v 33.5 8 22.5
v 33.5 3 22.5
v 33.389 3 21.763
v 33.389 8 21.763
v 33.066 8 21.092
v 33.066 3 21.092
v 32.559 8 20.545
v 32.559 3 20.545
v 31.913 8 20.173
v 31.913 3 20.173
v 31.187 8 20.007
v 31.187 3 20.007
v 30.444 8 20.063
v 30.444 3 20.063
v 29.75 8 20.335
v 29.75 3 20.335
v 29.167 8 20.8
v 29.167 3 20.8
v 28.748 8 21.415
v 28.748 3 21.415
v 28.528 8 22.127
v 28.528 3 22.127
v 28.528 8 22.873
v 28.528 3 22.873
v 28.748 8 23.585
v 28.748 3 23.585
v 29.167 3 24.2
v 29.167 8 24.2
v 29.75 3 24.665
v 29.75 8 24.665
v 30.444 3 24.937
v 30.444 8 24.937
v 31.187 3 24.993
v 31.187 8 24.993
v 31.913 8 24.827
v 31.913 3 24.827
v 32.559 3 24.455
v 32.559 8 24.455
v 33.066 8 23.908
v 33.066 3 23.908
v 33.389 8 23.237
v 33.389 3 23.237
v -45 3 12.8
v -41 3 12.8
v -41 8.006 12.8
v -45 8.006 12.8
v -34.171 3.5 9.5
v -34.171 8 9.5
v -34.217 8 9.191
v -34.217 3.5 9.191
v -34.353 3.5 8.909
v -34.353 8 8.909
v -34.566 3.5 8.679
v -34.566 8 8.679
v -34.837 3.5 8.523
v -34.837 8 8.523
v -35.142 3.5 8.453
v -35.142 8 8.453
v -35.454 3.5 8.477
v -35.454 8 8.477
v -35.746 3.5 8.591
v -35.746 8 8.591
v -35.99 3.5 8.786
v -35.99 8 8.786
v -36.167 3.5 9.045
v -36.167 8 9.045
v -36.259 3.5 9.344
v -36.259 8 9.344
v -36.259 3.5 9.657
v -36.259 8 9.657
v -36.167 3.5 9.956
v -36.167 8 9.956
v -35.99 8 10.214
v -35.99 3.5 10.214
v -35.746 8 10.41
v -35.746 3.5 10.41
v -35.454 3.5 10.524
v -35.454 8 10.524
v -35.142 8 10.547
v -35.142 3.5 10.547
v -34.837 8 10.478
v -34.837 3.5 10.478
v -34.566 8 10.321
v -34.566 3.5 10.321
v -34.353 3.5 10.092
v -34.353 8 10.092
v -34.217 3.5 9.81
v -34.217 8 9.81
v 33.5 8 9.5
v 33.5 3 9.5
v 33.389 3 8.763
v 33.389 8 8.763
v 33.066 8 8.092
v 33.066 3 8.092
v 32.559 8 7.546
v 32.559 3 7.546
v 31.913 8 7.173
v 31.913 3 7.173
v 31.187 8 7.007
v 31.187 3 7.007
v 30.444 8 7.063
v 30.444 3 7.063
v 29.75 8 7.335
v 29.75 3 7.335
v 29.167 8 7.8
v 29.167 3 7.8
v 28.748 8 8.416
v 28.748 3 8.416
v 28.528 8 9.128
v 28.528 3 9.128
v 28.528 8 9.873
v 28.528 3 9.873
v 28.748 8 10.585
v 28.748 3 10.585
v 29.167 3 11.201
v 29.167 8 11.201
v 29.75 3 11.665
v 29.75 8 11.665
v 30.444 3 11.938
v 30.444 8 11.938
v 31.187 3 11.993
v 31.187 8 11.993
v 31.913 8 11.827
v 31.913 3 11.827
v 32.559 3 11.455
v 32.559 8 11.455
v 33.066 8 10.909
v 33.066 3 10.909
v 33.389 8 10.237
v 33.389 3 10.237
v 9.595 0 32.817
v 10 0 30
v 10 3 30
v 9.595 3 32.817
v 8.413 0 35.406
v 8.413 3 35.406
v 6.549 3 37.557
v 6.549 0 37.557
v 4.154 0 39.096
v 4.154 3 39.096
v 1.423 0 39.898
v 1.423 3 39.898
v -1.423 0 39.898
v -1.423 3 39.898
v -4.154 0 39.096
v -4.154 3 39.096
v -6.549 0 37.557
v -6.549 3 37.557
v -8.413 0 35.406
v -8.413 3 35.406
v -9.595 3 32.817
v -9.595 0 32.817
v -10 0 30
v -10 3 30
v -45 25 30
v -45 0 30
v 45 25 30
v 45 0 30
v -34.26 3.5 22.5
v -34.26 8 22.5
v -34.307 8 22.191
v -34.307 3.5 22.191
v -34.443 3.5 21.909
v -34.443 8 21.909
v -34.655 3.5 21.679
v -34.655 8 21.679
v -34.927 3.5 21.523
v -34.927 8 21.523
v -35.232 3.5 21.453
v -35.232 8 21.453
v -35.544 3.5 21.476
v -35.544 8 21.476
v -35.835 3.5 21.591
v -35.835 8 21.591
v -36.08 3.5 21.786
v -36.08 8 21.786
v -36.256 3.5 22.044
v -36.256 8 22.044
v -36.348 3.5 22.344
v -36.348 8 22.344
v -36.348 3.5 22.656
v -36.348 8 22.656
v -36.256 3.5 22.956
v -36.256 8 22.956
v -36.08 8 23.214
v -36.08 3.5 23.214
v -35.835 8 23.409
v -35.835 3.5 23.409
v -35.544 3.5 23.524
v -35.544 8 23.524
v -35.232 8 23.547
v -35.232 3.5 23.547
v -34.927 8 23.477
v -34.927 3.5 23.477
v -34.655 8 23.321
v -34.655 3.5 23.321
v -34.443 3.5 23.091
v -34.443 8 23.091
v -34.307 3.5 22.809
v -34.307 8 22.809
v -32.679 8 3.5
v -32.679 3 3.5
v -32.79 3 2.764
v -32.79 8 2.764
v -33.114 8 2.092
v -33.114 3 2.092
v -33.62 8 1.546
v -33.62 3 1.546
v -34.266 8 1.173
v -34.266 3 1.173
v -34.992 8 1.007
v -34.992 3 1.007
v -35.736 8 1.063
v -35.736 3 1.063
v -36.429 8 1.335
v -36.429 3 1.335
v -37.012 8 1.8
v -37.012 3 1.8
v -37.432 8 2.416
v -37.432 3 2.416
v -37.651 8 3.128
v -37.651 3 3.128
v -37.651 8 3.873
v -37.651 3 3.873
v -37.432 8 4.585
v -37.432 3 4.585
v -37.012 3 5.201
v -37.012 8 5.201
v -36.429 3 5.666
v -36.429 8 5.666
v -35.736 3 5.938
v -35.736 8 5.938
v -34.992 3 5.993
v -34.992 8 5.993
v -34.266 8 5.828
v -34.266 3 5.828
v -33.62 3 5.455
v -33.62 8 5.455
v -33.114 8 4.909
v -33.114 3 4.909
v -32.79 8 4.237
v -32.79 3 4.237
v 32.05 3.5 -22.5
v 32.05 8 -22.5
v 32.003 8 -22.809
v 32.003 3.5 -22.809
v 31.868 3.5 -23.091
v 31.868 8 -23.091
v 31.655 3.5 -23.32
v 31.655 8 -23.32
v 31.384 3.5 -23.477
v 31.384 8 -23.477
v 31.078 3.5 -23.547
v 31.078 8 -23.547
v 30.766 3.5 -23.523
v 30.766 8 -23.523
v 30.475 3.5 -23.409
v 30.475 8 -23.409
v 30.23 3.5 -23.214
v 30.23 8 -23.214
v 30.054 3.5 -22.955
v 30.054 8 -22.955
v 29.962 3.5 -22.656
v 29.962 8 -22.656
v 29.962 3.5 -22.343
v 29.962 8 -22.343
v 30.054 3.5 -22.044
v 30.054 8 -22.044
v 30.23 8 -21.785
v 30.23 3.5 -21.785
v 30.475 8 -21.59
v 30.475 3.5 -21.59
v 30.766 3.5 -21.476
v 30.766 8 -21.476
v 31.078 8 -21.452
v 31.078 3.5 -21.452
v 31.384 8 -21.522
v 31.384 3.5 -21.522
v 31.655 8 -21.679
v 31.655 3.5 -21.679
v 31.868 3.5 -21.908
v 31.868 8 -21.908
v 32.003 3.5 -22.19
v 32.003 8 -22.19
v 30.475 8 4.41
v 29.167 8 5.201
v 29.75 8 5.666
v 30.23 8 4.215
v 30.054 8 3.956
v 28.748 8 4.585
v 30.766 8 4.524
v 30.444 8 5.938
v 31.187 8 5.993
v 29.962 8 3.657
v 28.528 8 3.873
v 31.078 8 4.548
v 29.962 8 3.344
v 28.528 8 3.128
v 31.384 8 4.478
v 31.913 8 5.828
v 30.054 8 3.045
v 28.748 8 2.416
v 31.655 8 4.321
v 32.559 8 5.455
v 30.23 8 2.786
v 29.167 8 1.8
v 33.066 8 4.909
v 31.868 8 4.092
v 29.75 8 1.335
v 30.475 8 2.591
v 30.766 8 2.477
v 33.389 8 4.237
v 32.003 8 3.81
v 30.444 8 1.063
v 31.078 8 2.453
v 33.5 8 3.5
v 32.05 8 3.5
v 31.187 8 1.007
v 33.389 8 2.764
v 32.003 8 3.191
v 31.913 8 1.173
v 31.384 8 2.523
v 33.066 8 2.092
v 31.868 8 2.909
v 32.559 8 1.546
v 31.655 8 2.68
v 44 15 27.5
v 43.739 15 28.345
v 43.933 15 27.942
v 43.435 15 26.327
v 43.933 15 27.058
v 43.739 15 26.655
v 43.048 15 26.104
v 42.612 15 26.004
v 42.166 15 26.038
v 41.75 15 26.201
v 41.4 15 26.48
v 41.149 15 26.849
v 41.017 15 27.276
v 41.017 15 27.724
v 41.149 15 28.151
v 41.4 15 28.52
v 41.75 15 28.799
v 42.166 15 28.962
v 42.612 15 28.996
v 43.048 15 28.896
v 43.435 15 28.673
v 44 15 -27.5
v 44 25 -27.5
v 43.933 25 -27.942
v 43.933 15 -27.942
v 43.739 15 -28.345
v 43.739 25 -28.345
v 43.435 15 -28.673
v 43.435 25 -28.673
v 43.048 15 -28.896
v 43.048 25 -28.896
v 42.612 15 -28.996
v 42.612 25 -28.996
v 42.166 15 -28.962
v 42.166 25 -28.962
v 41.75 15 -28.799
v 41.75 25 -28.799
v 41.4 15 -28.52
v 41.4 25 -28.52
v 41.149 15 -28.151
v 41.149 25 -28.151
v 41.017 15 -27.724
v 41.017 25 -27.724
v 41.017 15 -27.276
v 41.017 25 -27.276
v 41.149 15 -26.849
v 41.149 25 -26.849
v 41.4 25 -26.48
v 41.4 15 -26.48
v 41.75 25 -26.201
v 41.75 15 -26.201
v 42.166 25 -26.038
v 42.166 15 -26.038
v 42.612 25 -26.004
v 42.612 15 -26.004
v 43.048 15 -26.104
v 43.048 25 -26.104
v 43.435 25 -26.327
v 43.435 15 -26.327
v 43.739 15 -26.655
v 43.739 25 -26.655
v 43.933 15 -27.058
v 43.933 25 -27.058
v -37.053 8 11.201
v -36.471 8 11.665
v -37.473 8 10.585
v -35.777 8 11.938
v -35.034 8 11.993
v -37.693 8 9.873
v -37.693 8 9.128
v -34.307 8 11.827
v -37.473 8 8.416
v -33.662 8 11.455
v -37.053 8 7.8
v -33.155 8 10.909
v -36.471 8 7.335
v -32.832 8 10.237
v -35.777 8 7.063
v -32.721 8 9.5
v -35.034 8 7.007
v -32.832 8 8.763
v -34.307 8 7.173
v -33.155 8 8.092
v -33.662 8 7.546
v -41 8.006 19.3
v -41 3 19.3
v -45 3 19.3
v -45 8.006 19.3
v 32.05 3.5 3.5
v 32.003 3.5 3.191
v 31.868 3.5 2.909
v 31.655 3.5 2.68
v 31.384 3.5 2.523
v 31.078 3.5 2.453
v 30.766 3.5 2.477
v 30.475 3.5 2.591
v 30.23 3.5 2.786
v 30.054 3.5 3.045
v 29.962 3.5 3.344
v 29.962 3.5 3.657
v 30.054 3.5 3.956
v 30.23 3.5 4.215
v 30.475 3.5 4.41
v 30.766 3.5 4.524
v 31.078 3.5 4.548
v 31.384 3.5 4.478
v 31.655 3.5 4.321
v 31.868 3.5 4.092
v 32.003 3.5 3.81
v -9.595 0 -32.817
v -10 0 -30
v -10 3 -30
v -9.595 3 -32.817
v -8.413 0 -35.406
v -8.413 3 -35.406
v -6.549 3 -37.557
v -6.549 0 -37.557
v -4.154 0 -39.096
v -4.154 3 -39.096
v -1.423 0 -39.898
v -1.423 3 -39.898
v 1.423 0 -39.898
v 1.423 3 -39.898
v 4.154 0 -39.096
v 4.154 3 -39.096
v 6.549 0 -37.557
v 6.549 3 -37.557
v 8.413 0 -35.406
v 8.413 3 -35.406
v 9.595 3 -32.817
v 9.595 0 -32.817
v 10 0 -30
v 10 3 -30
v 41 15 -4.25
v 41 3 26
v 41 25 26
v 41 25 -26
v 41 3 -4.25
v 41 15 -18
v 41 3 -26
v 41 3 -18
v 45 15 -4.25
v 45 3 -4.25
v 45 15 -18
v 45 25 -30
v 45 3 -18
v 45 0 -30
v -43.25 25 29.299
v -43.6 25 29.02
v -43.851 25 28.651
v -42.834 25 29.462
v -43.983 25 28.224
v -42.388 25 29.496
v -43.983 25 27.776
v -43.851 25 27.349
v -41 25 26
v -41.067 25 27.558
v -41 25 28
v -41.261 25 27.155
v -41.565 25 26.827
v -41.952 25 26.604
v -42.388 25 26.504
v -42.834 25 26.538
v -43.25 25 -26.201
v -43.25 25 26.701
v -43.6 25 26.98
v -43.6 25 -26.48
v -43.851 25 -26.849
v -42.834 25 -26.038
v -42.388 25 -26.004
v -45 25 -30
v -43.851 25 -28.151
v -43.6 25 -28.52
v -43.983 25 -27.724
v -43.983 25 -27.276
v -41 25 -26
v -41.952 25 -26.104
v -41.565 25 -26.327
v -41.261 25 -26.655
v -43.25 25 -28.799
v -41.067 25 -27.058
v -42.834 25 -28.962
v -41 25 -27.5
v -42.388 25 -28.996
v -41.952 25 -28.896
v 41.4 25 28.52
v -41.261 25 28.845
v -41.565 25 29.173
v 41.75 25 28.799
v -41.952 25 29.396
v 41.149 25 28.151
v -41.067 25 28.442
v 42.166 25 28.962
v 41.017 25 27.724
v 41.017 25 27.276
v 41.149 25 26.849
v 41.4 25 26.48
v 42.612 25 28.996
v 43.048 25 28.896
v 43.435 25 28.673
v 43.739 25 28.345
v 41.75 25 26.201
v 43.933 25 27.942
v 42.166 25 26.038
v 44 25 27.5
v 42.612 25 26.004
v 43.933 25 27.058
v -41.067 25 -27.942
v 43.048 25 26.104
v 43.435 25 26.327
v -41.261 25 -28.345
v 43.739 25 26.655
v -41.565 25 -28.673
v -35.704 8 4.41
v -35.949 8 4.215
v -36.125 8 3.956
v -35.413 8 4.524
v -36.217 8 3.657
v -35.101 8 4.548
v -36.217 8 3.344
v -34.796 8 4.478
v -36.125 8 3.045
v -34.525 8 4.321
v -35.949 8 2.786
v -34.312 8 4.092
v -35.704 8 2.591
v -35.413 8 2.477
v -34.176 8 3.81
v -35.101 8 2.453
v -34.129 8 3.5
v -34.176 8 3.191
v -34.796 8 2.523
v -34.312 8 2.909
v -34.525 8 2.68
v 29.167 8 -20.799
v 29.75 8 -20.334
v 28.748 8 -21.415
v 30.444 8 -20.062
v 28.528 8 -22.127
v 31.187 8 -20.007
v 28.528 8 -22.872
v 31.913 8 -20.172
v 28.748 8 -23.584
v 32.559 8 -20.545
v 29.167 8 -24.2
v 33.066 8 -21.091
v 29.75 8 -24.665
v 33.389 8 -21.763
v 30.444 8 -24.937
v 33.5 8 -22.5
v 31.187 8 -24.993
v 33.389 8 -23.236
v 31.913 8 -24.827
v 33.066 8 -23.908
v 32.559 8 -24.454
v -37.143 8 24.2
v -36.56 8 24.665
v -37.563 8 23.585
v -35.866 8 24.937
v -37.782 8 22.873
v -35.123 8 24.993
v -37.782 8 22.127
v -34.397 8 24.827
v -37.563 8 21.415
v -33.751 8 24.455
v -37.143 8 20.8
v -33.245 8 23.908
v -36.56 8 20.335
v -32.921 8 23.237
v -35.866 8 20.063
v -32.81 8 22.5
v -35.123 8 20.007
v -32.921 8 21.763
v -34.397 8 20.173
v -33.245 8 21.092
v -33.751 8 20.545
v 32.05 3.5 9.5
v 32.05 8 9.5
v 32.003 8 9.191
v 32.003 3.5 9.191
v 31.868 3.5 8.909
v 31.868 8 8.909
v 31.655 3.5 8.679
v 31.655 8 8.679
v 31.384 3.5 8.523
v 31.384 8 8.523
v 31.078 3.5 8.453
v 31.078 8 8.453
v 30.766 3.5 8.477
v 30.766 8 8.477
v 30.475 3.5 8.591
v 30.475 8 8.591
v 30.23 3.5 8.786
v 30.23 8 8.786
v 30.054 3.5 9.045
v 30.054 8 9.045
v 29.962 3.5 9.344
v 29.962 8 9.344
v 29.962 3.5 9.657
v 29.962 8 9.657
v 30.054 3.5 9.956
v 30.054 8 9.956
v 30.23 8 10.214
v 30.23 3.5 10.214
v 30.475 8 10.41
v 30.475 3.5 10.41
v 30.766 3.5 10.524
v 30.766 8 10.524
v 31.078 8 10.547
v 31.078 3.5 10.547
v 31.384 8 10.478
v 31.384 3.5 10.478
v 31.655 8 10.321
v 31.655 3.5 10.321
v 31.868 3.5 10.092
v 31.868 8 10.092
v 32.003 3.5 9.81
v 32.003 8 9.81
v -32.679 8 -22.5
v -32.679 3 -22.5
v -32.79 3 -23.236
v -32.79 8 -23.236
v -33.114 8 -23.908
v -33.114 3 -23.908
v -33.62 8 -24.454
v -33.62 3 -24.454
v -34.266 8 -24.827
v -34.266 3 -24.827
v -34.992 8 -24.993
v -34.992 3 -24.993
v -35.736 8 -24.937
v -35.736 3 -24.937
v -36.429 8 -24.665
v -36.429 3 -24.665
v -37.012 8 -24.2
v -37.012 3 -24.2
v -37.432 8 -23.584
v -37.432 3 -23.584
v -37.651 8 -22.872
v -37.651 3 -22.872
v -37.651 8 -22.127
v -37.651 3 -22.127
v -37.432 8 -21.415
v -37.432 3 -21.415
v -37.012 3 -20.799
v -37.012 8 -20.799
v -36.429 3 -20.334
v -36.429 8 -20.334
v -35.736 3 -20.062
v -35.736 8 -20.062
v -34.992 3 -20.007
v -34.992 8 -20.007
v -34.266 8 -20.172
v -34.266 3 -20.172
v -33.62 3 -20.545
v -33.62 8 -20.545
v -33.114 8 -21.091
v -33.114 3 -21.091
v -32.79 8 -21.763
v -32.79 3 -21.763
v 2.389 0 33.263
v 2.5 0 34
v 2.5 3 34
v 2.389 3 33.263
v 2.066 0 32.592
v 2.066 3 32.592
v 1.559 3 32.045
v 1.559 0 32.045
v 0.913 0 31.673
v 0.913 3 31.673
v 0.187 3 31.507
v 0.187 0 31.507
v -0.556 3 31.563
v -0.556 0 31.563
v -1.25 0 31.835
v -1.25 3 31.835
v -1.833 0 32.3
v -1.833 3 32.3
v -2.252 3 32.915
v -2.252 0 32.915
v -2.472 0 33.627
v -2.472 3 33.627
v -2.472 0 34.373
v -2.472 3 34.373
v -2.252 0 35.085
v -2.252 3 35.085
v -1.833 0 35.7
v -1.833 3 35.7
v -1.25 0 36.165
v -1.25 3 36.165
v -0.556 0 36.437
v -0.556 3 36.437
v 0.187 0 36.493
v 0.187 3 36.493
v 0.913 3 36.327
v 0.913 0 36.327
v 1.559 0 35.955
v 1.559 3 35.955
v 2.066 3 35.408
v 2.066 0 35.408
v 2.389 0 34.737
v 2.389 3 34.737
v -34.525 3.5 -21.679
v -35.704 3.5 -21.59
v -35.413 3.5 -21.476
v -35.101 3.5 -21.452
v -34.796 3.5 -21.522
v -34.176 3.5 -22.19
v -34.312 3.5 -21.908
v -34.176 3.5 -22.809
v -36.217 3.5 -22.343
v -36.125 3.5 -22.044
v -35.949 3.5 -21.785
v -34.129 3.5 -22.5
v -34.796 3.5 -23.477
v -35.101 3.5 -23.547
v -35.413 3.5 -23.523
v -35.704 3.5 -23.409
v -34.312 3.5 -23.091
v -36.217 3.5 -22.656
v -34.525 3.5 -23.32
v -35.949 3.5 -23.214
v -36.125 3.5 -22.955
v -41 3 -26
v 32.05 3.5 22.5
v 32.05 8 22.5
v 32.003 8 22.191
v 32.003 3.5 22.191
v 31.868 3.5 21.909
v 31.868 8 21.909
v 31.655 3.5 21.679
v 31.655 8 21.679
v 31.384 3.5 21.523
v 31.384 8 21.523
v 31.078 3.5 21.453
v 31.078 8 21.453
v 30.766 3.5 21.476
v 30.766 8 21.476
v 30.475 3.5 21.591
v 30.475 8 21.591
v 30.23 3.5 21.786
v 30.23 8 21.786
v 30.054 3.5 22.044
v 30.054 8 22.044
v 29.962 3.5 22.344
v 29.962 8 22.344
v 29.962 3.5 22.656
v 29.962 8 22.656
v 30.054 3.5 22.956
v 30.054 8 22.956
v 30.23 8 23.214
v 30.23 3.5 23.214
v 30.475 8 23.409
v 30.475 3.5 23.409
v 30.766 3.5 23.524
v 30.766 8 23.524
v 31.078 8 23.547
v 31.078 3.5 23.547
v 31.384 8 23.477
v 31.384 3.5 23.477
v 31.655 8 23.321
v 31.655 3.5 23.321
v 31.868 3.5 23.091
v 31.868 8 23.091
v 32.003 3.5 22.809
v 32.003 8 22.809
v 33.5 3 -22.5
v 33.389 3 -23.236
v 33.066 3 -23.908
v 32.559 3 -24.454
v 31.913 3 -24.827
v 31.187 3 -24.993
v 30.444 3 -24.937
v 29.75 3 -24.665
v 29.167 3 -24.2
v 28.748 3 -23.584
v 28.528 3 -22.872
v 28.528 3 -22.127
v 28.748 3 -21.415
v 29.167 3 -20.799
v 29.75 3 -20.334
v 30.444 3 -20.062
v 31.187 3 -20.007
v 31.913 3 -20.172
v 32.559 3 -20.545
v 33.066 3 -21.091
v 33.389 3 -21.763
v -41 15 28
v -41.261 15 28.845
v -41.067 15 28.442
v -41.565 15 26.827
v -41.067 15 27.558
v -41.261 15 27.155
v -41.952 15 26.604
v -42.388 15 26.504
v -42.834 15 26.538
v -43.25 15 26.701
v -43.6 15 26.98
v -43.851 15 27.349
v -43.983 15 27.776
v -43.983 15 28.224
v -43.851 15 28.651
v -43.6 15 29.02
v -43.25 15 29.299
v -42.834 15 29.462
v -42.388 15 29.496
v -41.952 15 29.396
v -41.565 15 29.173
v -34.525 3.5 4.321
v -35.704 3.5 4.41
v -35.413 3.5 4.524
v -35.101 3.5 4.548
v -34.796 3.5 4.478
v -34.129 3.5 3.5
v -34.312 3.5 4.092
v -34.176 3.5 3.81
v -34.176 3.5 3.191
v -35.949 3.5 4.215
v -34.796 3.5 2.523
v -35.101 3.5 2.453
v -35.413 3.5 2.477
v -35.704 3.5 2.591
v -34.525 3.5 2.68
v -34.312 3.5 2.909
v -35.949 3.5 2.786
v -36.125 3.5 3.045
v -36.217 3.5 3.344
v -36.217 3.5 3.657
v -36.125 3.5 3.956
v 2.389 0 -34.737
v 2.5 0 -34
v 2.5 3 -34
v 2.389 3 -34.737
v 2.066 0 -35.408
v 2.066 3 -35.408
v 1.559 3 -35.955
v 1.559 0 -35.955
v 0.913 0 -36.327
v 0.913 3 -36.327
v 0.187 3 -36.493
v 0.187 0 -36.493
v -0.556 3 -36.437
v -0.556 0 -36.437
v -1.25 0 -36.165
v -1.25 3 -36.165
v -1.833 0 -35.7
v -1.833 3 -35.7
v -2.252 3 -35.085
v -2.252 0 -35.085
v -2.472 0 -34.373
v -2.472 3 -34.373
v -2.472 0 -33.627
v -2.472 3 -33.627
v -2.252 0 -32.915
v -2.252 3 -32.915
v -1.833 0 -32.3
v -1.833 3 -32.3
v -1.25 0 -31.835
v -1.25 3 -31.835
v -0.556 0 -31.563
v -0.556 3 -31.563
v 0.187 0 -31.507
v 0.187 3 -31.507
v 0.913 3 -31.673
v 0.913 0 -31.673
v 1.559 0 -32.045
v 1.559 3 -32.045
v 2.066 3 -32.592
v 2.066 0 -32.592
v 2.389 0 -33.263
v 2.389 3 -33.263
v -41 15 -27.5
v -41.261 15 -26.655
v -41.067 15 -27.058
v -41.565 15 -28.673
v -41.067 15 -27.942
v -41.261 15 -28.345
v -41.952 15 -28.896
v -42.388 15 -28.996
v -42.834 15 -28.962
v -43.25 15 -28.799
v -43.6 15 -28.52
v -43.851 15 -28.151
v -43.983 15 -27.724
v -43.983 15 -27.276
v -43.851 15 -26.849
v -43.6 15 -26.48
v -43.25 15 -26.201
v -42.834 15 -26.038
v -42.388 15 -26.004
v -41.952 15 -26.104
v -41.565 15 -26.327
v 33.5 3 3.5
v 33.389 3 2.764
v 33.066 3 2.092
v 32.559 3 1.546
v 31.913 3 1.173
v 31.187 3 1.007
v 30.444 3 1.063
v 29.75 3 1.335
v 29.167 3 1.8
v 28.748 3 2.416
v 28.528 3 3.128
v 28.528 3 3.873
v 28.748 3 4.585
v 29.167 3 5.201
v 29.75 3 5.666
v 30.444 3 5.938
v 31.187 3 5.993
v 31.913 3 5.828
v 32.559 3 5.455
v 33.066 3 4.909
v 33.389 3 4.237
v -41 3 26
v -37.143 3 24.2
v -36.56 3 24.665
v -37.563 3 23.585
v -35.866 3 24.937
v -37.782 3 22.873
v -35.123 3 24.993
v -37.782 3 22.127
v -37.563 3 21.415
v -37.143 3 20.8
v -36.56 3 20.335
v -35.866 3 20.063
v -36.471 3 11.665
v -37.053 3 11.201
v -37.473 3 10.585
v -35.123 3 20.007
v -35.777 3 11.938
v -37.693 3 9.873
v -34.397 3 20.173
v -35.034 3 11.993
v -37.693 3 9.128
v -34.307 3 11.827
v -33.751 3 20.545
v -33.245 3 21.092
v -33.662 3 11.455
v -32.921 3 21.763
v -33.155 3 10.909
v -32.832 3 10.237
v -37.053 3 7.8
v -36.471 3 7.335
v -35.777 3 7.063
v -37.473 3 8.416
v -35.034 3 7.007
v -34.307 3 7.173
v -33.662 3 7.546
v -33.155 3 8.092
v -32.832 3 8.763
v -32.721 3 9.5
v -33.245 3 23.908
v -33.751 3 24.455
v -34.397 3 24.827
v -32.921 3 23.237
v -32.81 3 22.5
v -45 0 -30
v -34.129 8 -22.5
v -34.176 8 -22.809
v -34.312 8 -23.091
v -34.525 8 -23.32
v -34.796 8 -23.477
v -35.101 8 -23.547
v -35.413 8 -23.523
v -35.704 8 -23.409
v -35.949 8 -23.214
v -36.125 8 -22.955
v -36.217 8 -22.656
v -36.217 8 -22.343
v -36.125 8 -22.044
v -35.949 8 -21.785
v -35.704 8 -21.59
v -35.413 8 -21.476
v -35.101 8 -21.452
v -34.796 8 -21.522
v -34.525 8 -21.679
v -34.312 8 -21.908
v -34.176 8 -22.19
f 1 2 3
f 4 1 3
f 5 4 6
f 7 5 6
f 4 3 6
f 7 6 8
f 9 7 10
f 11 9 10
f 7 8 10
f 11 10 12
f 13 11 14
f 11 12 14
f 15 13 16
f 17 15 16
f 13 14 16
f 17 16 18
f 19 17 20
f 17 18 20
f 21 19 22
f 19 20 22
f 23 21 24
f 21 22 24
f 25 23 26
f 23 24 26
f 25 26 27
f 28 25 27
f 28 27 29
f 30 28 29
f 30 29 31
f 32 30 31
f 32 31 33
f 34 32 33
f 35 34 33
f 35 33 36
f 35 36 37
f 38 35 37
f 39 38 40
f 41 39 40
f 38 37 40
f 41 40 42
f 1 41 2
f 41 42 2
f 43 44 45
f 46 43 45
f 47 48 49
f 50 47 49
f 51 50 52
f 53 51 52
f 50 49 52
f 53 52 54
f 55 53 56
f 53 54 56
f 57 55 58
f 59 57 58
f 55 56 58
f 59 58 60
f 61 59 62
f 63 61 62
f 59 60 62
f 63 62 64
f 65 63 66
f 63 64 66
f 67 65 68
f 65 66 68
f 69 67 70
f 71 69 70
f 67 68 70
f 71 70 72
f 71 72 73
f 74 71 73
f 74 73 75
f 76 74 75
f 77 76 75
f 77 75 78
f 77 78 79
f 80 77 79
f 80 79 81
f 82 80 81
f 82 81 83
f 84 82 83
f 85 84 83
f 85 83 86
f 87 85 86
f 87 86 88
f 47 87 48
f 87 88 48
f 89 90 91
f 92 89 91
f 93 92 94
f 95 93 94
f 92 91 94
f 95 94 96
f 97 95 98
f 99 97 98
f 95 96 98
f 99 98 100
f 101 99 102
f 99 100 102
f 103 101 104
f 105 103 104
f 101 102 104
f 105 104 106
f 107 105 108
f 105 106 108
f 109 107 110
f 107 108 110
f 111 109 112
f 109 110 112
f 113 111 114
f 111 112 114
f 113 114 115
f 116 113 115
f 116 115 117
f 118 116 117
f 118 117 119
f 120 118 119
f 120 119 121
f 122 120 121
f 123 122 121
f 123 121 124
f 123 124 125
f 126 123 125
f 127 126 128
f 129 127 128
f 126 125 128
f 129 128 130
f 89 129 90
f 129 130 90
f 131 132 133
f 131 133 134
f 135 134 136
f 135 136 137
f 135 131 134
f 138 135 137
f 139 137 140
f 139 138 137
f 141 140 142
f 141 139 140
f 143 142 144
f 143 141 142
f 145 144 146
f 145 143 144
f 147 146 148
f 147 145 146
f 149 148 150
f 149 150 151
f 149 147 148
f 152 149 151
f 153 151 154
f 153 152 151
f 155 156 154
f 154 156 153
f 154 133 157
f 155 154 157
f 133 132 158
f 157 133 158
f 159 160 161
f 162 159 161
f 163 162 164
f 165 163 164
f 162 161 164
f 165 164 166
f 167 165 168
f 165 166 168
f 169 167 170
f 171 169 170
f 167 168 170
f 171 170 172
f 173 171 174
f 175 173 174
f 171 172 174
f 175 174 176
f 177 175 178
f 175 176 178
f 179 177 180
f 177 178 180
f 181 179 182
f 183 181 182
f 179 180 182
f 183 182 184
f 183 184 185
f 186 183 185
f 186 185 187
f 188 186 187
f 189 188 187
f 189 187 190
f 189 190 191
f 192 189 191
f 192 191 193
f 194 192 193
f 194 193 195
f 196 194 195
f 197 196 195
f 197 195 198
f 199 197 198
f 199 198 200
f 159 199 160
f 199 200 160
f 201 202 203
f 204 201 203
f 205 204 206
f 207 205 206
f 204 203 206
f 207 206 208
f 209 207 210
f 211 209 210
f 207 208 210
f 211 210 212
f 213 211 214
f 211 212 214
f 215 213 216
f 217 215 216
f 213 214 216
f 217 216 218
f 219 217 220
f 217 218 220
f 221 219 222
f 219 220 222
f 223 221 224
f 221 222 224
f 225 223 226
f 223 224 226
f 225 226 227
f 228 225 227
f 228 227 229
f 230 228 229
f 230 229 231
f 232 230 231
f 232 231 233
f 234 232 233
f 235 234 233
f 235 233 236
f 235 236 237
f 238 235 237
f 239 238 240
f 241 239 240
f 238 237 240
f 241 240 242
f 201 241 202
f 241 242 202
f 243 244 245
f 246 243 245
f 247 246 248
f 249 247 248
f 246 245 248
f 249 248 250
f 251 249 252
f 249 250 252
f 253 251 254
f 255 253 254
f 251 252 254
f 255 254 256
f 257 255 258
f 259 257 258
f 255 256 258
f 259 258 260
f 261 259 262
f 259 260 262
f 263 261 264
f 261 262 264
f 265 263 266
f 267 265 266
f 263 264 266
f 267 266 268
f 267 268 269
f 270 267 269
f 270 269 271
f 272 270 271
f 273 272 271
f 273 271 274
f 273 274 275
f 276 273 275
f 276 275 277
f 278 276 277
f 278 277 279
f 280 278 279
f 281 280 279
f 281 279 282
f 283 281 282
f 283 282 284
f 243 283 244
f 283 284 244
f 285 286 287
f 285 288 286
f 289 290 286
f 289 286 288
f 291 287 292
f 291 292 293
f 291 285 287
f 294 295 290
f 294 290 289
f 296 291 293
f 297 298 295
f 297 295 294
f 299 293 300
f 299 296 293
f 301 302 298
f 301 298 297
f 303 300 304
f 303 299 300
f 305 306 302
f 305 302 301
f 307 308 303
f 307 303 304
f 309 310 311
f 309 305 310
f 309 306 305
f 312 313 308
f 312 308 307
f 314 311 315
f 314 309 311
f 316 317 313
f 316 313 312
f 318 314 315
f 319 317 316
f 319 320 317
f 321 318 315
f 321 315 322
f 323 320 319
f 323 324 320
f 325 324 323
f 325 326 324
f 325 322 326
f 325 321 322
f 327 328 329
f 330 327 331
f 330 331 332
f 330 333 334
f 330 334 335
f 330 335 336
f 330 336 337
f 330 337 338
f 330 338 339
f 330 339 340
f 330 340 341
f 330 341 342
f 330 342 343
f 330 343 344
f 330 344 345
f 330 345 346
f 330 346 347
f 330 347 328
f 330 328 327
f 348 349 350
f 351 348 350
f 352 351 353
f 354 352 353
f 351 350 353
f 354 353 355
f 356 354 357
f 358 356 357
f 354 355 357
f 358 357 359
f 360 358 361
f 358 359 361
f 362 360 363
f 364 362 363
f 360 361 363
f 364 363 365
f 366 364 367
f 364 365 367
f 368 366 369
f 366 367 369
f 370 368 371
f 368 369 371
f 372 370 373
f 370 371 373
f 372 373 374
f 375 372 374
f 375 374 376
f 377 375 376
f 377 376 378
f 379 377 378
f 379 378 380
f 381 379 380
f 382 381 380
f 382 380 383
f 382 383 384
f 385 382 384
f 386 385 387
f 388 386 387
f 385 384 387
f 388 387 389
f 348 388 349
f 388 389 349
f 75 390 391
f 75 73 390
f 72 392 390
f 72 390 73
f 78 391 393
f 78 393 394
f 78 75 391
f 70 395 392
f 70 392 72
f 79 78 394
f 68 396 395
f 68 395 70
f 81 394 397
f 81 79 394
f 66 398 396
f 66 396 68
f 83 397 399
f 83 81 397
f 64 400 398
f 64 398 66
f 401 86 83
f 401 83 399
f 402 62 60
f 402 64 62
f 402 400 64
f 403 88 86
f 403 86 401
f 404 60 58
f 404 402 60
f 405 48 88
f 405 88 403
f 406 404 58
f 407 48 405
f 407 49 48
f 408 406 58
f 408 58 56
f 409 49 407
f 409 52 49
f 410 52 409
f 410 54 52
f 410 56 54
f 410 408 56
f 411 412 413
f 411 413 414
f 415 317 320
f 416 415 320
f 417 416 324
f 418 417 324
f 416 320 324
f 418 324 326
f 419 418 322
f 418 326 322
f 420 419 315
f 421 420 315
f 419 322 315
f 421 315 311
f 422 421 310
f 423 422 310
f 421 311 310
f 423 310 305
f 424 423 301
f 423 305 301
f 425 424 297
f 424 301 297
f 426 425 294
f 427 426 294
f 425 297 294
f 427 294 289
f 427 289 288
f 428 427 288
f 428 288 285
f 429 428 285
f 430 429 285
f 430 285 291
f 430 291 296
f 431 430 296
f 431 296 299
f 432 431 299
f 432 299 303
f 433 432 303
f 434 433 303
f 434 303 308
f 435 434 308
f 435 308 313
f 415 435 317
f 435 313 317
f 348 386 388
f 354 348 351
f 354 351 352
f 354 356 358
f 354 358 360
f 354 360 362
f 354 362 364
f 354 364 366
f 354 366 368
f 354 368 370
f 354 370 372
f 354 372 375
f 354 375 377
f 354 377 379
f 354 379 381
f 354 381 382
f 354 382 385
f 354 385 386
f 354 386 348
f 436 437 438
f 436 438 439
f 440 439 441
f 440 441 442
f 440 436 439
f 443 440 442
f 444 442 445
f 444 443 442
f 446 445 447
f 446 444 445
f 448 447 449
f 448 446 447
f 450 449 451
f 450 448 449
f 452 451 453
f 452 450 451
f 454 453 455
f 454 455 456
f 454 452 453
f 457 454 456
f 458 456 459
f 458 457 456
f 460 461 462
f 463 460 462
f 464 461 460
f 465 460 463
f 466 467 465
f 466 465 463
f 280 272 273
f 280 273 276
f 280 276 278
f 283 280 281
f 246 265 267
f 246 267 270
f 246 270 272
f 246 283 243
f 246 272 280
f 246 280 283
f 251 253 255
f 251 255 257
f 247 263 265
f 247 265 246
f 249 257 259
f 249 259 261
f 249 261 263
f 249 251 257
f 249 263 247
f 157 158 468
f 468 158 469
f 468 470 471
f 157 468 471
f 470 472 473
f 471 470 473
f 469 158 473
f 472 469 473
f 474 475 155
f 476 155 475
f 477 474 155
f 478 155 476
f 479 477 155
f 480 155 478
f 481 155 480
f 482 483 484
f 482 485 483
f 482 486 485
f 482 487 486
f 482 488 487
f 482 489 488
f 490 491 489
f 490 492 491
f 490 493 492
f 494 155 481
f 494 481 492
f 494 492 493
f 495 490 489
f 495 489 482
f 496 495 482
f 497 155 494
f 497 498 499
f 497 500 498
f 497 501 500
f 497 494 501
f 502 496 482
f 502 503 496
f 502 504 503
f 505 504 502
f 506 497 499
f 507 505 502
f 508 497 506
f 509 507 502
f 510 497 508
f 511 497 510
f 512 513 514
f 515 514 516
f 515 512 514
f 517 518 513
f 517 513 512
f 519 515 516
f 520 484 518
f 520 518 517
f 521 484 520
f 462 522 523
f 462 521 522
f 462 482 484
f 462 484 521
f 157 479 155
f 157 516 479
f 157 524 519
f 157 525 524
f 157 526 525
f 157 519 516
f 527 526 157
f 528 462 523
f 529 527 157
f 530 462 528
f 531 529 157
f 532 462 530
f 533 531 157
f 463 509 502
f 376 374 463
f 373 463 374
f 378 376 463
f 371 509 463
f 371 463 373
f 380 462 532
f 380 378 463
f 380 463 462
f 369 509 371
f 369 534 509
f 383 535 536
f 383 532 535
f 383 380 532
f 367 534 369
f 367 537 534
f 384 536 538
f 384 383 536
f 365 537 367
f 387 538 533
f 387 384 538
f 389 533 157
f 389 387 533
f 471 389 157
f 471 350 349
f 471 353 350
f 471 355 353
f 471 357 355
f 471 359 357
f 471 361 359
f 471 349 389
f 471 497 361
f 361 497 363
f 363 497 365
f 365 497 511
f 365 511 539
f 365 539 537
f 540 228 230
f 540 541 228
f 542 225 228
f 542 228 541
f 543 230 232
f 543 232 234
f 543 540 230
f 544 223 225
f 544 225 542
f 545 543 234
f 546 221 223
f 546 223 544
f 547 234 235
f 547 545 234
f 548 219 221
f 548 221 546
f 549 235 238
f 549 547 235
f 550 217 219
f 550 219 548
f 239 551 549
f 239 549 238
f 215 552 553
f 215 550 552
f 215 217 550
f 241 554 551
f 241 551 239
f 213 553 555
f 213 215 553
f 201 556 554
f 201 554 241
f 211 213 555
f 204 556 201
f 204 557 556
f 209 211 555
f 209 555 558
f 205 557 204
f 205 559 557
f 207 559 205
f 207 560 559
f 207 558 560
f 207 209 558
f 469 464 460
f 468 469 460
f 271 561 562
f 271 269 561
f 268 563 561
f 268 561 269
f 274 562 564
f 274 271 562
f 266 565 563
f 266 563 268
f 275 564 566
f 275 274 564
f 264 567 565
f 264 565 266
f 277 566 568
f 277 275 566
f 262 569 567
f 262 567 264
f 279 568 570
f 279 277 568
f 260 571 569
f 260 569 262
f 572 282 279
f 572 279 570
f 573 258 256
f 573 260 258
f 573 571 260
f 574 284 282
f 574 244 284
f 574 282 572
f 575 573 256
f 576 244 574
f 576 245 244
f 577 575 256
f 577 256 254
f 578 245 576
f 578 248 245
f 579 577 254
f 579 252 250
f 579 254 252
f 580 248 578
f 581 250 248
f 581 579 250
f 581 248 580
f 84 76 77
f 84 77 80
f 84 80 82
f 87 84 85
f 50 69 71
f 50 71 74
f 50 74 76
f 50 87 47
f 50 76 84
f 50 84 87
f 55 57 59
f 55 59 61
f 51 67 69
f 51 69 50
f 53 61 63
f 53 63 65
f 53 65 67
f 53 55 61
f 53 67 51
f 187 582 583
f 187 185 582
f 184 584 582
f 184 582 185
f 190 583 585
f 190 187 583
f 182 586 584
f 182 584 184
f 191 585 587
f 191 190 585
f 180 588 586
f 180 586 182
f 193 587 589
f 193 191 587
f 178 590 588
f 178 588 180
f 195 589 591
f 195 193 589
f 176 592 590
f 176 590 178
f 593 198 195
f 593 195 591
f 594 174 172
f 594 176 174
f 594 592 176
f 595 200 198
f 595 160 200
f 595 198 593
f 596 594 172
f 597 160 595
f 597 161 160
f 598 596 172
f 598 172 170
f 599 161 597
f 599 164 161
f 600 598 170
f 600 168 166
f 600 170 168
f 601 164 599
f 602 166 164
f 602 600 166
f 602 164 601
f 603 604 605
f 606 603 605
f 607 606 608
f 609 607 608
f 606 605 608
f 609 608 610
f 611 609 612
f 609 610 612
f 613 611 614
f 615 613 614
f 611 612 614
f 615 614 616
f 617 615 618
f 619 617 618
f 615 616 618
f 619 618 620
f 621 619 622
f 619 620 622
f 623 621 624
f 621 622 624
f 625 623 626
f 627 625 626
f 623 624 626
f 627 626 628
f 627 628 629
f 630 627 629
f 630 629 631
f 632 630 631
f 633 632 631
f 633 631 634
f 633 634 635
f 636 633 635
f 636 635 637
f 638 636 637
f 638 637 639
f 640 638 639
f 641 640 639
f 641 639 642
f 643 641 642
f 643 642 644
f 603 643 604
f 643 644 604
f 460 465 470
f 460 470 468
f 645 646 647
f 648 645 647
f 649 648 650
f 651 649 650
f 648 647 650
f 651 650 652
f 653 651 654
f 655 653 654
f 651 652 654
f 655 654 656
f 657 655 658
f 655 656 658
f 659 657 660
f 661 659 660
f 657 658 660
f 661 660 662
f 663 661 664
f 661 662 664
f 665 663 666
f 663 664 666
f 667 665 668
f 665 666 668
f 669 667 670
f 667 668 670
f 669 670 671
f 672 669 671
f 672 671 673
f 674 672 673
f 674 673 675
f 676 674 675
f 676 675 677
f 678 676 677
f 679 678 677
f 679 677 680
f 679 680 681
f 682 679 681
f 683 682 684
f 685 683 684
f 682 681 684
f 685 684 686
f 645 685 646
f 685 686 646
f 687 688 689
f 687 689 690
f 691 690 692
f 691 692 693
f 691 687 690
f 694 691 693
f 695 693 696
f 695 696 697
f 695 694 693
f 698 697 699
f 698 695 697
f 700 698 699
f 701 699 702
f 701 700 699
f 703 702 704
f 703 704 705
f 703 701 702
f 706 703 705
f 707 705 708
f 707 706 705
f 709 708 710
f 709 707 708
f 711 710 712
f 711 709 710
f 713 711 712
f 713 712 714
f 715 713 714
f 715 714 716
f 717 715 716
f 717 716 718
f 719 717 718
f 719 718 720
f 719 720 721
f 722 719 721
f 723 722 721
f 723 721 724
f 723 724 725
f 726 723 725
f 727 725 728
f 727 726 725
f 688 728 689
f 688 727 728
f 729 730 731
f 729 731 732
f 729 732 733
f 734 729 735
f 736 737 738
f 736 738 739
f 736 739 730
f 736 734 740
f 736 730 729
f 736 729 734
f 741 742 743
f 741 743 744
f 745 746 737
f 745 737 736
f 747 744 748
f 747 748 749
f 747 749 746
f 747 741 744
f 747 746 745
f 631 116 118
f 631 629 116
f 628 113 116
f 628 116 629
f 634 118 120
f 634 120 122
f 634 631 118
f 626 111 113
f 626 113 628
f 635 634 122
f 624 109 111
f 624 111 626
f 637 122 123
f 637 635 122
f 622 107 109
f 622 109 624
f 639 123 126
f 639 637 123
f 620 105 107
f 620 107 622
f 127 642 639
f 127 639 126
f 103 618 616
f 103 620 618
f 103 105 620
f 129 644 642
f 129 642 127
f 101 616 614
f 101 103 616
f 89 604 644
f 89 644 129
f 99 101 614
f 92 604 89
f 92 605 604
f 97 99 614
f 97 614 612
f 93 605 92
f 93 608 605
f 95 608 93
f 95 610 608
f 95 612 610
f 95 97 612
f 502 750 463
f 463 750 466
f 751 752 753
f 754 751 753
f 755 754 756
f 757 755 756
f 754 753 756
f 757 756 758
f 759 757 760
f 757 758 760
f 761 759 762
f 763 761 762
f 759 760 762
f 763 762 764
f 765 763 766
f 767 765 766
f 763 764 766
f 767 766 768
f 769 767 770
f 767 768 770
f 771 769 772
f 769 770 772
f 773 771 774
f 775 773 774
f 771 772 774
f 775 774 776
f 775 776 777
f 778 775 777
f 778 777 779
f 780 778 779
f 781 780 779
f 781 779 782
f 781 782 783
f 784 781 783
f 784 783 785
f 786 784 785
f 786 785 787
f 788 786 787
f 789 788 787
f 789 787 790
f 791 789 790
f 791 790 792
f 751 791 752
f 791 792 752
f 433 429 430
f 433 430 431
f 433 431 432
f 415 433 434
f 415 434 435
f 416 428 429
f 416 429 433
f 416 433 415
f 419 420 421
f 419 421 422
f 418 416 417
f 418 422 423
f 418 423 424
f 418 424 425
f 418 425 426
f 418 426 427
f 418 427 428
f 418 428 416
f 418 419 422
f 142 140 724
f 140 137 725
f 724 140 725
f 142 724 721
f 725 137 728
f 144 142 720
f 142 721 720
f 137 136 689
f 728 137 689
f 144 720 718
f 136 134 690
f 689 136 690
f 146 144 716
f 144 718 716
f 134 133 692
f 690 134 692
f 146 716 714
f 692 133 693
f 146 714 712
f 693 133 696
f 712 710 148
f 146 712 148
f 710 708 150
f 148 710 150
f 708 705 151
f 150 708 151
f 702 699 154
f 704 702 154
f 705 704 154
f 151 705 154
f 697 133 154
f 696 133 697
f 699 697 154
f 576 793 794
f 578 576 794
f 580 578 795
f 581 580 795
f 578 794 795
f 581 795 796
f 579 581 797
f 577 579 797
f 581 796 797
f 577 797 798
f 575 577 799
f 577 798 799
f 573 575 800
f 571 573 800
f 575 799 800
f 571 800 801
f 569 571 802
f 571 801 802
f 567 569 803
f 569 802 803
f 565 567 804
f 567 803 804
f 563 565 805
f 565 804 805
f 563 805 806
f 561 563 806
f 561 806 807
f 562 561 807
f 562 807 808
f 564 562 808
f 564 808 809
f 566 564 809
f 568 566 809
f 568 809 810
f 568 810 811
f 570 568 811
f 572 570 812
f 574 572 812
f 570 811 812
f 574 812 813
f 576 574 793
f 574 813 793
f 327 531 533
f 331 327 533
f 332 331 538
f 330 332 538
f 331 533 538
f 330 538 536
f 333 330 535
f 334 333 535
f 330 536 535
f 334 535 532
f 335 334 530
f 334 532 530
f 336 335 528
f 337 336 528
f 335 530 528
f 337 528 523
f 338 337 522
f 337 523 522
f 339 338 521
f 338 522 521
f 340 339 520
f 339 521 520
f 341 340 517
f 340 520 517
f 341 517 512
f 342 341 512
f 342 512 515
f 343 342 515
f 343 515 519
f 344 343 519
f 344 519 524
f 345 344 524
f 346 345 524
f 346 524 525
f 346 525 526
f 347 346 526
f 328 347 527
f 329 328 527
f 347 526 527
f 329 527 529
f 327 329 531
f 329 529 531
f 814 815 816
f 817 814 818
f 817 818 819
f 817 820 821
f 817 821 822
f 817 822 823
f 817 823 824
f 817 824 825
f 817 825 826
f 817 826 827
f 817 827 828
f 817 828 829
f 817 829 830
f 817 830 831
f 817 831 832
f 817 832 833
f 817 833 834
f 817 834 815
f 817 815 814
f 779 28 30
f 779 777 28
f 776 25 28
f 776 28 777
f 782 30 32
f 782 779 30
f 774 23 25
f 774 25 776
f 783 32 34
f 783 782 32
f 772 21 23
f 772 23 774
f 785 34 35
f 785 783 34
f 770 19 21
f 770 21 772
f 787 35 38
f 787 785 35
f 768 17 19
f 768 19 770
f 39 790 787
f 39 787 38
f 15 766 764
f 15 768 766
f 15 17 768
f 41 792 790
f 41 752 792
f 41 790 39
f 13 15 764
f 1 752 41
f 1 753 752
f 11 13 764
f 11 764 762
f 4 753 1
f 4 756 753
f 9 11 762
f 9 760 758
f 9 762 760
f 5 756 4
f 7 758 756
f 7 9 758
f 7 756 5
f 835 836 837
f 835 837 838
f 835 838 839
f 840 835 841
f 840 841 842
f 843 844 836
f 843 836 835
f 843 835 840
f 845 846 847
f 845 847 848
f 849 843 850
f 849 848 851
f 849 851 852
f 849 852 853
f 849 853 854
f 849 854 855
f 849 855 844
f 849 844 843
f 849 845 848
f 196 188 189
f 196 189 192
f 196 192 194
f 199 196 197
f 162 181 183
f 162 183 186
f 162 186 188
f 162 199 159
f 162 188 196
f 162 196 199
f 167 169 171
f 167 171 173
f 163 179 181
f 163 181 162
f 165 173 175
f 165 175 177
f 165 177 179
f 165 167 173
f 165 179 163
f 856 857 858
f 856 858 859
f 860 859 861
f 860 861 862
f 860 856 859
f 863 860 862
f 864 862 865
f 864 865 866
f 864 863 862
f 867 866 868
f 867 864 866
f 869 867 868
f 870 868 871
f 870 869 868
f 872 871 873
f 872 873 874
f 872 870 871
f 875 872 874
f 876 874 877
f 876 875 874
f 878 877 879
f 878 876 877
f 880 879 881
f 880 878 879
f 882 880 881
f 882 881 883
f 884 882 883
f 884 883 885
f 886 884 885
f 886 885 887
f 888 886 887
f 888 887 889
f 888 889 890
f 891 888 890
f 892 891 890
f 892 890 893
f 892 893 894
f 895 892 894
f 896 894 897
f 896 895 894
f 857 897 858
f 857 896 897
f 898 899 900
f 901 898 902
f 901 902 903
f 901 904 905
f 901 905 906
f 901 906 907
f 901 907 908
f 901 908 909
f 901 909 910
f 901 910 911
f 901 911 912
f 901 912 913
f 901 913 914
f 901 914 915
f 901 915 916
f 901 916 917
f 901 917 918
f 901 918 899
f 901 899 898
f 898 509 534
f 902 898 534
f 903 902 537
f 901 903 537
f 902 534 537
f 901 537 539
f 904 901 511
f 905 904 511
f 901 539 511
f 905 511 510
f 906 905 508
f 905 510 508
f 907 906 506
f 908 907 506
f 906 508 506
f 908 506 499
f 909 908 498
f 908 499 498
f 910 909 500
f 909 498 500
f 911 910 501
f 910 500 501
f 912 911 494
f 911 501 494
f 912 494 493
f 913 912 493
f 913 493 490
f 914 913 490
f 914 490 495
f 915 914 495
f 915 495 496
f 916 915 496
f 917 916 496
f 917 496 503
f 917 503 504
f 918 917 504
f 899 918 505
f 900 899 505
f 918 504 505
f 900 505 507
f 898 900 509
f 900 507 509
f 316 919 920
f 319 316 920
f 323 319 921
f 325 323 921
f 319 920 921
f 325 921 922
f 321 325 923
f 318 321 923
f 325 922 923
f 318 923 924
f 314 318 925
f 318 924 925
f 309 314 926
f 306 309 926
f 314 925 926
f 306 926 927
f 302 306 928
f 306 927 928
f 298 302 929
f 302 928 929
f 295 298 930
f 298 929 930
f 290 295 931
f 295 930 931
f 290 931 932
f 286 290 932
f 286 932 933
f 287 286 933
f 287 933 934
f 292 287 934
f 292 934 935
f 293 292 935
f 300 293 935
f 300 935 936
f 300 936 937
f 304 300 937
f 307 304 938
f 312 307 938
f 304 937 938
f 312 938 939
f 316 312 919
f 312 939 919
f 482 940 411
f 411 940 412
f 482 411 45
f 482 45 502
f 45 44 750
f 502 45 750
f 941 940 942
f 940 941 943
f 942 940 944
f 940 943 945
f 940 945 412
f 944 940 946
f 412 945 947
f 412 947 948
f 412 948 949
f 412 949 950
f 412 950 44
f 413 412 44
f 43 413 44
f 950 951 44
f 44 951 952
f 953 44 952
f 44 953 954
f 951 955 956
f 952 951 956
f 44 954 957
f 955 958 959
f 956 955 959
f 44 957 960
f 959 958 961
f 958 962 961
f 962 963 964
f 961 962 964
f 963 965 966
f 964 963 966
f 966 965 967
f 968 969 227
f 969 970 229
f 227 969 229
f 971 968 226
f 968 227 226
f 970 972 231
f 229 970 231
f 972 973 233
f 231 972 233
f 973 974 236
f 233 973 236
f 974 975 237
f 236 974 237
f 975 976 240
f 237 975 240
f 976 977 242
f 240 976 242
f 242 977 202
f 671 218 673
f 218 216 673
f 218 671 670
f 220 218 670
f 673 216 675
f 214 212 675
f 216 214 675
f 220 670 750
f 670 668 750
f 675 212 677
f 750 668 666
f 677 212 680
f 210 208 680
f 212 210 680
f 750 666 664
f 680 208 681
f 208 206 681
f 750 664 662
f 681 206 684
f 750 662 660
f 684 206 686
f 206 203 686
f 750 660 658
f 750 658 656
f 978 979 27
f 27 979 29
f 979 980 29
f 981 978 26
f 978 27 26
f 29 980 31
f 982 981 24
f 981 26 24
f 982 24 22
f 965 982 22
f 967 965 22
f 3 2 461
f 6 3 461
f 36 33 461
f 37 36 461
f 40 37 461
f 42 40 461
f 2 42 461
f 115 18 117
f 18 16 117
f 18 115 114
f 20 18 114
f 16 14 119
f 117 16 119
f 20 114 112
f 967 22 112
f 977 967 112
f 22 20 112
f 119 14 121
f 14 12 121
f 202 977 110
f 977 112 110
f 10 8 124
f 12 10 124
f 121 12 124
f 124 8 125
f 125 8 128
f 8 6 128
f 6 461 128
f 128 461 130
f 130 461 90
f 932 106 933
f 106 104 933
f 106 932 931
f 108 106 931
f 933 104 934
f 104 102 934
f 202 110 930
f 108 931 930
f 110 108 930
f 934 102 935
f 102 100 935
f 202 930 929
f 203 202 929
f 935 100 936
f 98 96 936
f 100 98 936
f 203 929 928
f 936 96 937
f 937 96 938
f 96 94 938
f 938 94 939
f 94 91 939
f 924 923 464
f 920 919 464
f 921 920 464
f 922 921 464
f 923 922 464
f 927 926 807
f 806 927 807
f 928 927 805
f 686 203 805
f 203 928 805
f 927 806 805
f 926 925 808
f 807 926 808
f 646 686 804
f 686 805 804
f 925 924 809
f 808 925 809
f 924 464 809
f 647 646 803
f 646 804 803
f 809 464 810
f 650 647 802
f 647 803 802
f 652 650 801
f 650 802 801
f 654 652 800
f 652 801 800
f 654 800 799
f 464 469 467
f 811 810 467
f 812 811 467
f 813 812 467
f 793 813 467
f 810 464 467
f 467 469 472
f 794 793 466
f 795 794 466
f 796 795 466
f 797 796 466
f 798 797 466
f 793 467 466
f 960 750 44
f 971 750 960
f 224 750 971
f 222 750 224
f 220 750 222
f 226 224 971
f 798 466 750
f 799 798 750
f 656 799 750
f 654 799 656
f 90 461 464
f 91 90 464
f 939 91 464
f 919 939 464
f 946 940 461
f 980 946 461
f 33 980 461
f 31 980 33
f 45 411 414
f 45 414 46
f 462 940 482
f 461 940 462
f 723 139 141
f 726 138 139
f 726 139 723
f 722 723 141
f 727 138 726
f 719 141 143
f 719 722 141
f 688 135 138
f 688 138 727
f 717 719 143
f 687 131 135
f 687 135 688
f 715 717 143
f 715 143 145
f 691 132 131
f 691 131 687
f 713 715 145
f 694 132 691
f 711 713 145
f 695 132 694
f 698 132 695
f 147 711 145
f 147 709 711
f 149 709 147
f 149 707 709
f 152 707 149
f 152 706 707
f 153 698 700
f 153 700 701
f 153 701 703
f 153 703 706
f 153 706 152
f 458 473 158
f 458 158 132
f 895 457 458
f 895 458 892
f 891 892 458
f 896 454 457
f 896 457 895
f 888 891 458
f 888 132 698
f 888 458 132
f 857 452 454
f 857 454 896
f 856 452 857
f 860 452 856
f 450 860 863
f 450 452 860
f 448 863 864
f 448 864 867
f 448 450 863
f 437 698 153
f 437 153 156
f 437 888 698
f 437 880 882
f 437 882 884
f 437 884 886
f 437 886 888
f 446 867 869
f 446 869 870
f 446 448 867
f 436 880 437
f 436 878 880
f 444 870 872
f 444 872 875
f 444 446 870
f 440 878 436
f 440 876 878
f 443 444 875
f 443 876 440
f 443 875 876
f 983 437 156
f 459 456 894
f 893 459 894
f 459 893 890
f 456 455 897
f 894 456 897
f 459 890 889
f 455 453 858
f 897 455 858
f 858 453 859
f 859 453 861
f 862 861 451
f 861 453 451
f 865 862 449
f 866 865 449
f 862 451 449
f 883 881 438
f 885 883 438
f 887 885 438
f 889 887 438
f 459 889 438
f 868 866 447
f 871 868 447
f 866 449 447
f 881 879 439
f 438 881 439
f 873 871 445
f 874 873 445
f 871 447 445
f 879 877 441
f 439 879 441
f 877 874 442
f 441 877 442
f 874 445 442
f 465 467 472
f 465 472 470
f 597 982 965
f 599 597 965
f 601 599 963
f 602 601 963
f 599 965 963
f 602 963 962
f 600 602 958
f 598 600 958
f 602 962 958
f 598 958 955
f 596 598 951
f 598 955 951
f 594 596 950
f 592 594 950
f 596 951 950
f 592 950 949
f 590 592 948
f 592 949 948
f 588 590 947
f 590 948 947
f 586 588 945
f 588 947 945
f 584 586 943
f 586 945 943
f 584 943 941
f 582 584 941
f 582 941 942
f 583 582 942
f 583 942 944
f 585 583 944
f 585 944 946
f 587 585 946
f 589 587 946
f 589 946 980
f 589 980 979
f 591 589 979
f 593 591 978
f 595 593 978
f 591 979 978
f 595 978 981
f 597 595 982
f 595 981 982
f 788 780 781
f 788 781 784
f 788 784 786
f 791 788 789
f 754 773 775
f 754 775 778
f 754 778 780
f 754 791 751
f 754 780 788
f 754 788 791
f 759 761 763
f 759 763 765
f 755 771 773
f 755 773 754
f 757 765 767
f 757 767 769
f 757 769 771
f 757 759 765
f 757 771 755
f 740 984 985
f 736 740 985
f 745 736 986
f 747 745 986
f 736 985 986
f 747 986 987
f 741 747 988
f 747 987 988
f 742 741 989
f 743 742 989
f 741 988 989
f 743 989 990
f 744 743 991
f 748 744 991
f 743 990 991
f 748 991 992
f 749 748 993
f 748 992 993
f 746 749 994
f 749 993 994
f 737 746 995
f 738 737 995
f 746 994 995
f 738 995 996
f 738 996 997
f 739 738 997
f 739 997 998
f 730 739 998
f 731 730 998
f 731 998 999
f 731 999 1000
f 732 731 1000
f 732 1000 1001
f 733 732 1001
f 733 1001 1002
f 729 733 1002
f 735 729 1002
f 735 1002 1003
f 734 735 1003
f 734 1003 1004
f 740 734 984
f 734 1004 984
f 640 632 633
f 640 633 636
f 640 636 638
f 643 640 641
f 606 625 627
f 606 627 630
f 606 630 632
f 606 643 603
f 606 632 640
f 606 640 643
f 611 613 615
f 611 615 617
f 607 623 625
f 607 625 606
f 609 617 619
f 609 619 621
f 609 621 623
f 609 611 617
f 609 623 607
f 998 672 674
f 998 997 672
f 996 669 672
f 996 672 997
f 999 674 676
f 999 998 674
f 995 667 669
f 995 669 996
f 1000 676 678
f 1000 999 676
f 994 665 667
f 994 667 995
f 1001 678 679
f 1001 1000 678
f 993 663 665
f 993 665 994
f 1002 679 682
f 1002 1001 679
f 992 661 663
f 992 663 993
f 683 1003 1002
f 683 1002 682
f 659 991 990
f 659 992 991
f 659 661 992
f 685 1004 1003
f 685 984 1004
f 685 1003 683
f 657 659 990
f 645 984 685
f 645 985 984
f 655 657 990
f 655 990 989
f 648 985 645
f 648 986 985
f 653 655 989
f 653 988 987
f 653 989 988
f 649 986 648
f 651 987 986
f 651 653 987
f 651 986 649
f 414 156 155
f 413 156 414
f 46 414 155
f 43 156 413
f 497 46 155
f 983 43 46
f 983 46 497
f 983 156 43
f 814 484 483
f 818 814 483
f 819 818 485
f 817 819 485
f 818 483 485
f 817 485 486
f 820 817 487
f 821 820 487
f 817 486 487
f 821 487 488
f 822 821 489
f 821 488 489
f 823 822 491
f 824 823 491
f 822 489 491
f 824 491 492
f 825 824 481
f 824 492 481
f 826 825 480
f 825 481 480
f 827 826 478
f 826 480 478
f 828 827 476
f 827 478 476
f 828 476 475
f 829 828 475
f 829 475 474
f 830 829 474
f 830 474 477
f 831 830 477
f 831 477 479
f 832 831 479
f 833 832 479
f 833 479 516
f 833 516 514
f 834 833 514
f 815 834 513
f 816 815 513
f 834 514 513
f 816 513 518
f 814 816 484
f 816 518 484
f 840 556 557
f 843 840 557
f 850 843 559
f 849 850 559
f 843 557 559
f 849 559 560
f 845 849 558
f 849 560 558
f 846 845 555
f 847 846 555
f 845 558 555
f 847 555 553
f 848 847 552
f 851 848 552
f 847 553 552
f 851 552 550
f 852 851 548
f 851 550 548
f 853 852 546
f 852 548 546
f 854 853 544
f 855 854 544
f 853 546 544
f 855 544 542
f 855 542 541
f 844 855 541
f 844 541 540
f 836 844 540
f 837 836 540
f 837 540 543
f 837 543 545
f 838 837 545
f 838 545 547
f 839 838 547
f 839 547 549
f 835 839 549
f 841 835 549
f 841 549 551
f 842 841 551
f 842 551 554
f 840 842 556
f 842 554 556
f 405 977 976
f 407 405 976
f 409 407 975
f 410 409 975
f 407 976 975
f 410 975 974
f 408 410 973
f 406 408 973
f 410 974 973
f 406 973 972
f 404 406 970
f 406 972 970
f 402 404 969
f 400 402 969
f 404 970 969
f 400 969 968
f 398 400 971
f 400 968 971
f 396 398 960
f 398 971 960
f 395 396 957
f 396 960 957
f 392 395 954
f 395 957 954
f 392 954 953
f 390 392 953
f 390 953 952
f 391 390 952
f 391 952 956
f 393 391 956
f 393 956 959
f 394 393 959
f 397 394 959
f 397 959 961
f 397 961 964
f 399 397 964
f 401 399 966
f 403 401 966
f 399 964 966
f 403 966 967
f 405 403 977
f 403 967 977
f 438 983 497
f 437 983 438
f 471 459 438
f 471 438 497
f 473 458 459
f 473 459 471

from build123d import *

# Parameters (mm, degrees)
SKETCH1_R           = 2.5
BOSS_EXTRUDE1_DEPTH = 3
SKETCH2_R           = 2.5
BOSS_EXTRUDE2_DEPTH = 5
SKETCH4_R           = 1.05
CUT_EXTRUDE2_DEPTH  = 4.5
SKETCH6_W           = 90
SKETCH6_H           = 60
SKETCH6_W_2         = 82
SKETCH6_H_2         = 52
BOSS_EXTRUDE3_DEPTH = 22
SKETCH7_W           = 13.75
SKETCH7_H           = 12
CUT_EXTRUDE3_DEPTH  = 20
SKETCH8_R           = 1.5
CUT_EXTRUDE4_DEPTH  = 10
SKETCH10_W          = 6.5
SKETCH10_H          = 5.005531991
CUT_EXTRUDE5_DEPTH  = 10


with BuildPart() as part:
    # Sketch1 → Boss-Extrude1 (new body)
    with BuildSketch(Plane(origin=(0, 0, 0), x_dir=(1, 0, 0), z_dir=(0, 1, 0))):
        with BuildLine():
            Line((-45, 30), (-10, 30))
            ThreePointArc((-10, 30), (0, 40), (10, 30))
            Line((10, 30), (45, 30))
            Line((45, 30), (45, -30))
            Line((45, -30), (10, -30))
            ThreePointArc((10, -30), (0, -40), (-10, -30))
            Line((-10, -30), (-45, -30))
            Line((-45, -30), (-45, 30))
        make_face()
        with Locations((0, 34)):
            Circle(SKETCH1_R, mode=Mode.SUBTRACT)
        with Locations((0, -34)):
            Circle(SKETCH1_R, mode=Mode.SUBTRACT)
    extrude(amount=BOSS_EXTRUDE1_DEPTH)

    # Sketch2 → Boss-Extrude2 (add)
    with BuildSketch(Plane(origin=(0, 3, 0), x_dir=(1, 0, 0), z_dir=(0, 1, 0))):
        with Locations((-35.17920076, 22.499548704)):
            Circle(SKETCH2_R)
        with Locations((31, 22.499548704)):
            Circle(SKETCH2_R)
        with Locations((31, -3.500451296)):
            Circle(SKETCH2_R)
        with Locations((-35.17920076, -3.500451296)):
            Circle(SKETCH2_R)
        with Locations((-35.220554781, -9.500308782)):
            Circle(SKETCH2_R)
        with Locations((31, -9.500308782)):
            Circle(SKETCH2_R)
        with Locations((-35.310155161, -22.5)):
            Circle(SKETCH2_R)
        with Locations((31, -22.5)):
            Circle(SKETCH2_R)
    extrude(amount=BOSS_EXTRUDE2_DEPTH)

    # Sketch4 → Cut-Extrude2 (cut)
    with BuildSketch(Plane(origin=(0, 8, 0), x_dir=(1, 0, 0), z_dir=(0, 1, 0))):
        with Locations((-35.17920076, 22.499548704)):
            Circle(SKETCH4_R)
        with Locations((31, 22.499548704)):
            Circle(SKETCH4_R)
        with Locations((31, -3.500451296)):
            Circle(SKETCH4_R)
        with Locations((31, -9.500308782)):
            Circle(SKETCH4_R)
        with Locations((-35.17920076, -3.500451296)):
            Circle(SKETCH4_R)
        with Locations((-35.220554781, -9.500308782)):
            Circle(SKETCH4_R)
        with Locations((-35.310155161, -22.5)):
            Circle(SKETCH4_R)
        with Locations((31, -22.5)):
            Circle(SKETCH4_R)
    extrude(amount=-CUT_EXTRUDE2_DEPTH, mode=Mode.SUBTRACT)

    # Sketch6 → Boss-Extrude3 (add)
    with BuildSketch(Plane(origin=(0, 3, 0), x_dir=(1, 0, 0), z_dir=(0, 1, 0))):
        Rectangle(SKETCH6_W, SKETCH6_H)
        Rectangle(SKETCH6_W_2, SKETCH6_H_2, mode=Mode.SUBTRACT)
    extrude(amount=BOSS_EXTRUDE3_DEPTH)

    # Sketch7 → Cut-Extrude3 (cut)
    with BuildSketch(Plane.ZY.offset(-41)):
        with Locations((-11.125, 9)):
            Rectangle(SKETCH7_W, SKETCH7_H)
    extrude(amount=-CUT_EXTRUDE3_DEPTH, mode=Mode.SUBTRACT)

    # Sketch8 → Cut-Extrude4 (cut)
    with BuildSketch(Plane(origin=(0, 25, 0), x_dir=(1, 0, 0), z_dir=(0, 1, 0))):
        with Locations((-42.5, 27.5)):
            Circle(SKETCH8_R)
        with Locations((42.5, 27.5)):
            Circle(SKETCH8_R)
        with Locations((-42.5, -28)):
            Circle(SKETCH8_R)
        with Locations((42.5, -27.5)):
            Circle(SKETCH8_R)
    extrude(amount=-CUT_EXTRUDE4_DEPTH, mode=Mode.SUBTRACT)

    # Sketch10 → Cut-Extrude5 (cut)
    with BuildSketch(Plane(origin=(-41, 0, 0), x_dir=(0, 0, -1), z_dir=(1, 0, 0))):
        with Locations((-16.050308782, 5.502765995)):
            Rectangle(SKETCH10_W, SKETCH10_H)
    extrude(amount=-CUT_EXTRUDE5_DEPTH, mode=Mode.SUBTRACT)


solid = part.part
